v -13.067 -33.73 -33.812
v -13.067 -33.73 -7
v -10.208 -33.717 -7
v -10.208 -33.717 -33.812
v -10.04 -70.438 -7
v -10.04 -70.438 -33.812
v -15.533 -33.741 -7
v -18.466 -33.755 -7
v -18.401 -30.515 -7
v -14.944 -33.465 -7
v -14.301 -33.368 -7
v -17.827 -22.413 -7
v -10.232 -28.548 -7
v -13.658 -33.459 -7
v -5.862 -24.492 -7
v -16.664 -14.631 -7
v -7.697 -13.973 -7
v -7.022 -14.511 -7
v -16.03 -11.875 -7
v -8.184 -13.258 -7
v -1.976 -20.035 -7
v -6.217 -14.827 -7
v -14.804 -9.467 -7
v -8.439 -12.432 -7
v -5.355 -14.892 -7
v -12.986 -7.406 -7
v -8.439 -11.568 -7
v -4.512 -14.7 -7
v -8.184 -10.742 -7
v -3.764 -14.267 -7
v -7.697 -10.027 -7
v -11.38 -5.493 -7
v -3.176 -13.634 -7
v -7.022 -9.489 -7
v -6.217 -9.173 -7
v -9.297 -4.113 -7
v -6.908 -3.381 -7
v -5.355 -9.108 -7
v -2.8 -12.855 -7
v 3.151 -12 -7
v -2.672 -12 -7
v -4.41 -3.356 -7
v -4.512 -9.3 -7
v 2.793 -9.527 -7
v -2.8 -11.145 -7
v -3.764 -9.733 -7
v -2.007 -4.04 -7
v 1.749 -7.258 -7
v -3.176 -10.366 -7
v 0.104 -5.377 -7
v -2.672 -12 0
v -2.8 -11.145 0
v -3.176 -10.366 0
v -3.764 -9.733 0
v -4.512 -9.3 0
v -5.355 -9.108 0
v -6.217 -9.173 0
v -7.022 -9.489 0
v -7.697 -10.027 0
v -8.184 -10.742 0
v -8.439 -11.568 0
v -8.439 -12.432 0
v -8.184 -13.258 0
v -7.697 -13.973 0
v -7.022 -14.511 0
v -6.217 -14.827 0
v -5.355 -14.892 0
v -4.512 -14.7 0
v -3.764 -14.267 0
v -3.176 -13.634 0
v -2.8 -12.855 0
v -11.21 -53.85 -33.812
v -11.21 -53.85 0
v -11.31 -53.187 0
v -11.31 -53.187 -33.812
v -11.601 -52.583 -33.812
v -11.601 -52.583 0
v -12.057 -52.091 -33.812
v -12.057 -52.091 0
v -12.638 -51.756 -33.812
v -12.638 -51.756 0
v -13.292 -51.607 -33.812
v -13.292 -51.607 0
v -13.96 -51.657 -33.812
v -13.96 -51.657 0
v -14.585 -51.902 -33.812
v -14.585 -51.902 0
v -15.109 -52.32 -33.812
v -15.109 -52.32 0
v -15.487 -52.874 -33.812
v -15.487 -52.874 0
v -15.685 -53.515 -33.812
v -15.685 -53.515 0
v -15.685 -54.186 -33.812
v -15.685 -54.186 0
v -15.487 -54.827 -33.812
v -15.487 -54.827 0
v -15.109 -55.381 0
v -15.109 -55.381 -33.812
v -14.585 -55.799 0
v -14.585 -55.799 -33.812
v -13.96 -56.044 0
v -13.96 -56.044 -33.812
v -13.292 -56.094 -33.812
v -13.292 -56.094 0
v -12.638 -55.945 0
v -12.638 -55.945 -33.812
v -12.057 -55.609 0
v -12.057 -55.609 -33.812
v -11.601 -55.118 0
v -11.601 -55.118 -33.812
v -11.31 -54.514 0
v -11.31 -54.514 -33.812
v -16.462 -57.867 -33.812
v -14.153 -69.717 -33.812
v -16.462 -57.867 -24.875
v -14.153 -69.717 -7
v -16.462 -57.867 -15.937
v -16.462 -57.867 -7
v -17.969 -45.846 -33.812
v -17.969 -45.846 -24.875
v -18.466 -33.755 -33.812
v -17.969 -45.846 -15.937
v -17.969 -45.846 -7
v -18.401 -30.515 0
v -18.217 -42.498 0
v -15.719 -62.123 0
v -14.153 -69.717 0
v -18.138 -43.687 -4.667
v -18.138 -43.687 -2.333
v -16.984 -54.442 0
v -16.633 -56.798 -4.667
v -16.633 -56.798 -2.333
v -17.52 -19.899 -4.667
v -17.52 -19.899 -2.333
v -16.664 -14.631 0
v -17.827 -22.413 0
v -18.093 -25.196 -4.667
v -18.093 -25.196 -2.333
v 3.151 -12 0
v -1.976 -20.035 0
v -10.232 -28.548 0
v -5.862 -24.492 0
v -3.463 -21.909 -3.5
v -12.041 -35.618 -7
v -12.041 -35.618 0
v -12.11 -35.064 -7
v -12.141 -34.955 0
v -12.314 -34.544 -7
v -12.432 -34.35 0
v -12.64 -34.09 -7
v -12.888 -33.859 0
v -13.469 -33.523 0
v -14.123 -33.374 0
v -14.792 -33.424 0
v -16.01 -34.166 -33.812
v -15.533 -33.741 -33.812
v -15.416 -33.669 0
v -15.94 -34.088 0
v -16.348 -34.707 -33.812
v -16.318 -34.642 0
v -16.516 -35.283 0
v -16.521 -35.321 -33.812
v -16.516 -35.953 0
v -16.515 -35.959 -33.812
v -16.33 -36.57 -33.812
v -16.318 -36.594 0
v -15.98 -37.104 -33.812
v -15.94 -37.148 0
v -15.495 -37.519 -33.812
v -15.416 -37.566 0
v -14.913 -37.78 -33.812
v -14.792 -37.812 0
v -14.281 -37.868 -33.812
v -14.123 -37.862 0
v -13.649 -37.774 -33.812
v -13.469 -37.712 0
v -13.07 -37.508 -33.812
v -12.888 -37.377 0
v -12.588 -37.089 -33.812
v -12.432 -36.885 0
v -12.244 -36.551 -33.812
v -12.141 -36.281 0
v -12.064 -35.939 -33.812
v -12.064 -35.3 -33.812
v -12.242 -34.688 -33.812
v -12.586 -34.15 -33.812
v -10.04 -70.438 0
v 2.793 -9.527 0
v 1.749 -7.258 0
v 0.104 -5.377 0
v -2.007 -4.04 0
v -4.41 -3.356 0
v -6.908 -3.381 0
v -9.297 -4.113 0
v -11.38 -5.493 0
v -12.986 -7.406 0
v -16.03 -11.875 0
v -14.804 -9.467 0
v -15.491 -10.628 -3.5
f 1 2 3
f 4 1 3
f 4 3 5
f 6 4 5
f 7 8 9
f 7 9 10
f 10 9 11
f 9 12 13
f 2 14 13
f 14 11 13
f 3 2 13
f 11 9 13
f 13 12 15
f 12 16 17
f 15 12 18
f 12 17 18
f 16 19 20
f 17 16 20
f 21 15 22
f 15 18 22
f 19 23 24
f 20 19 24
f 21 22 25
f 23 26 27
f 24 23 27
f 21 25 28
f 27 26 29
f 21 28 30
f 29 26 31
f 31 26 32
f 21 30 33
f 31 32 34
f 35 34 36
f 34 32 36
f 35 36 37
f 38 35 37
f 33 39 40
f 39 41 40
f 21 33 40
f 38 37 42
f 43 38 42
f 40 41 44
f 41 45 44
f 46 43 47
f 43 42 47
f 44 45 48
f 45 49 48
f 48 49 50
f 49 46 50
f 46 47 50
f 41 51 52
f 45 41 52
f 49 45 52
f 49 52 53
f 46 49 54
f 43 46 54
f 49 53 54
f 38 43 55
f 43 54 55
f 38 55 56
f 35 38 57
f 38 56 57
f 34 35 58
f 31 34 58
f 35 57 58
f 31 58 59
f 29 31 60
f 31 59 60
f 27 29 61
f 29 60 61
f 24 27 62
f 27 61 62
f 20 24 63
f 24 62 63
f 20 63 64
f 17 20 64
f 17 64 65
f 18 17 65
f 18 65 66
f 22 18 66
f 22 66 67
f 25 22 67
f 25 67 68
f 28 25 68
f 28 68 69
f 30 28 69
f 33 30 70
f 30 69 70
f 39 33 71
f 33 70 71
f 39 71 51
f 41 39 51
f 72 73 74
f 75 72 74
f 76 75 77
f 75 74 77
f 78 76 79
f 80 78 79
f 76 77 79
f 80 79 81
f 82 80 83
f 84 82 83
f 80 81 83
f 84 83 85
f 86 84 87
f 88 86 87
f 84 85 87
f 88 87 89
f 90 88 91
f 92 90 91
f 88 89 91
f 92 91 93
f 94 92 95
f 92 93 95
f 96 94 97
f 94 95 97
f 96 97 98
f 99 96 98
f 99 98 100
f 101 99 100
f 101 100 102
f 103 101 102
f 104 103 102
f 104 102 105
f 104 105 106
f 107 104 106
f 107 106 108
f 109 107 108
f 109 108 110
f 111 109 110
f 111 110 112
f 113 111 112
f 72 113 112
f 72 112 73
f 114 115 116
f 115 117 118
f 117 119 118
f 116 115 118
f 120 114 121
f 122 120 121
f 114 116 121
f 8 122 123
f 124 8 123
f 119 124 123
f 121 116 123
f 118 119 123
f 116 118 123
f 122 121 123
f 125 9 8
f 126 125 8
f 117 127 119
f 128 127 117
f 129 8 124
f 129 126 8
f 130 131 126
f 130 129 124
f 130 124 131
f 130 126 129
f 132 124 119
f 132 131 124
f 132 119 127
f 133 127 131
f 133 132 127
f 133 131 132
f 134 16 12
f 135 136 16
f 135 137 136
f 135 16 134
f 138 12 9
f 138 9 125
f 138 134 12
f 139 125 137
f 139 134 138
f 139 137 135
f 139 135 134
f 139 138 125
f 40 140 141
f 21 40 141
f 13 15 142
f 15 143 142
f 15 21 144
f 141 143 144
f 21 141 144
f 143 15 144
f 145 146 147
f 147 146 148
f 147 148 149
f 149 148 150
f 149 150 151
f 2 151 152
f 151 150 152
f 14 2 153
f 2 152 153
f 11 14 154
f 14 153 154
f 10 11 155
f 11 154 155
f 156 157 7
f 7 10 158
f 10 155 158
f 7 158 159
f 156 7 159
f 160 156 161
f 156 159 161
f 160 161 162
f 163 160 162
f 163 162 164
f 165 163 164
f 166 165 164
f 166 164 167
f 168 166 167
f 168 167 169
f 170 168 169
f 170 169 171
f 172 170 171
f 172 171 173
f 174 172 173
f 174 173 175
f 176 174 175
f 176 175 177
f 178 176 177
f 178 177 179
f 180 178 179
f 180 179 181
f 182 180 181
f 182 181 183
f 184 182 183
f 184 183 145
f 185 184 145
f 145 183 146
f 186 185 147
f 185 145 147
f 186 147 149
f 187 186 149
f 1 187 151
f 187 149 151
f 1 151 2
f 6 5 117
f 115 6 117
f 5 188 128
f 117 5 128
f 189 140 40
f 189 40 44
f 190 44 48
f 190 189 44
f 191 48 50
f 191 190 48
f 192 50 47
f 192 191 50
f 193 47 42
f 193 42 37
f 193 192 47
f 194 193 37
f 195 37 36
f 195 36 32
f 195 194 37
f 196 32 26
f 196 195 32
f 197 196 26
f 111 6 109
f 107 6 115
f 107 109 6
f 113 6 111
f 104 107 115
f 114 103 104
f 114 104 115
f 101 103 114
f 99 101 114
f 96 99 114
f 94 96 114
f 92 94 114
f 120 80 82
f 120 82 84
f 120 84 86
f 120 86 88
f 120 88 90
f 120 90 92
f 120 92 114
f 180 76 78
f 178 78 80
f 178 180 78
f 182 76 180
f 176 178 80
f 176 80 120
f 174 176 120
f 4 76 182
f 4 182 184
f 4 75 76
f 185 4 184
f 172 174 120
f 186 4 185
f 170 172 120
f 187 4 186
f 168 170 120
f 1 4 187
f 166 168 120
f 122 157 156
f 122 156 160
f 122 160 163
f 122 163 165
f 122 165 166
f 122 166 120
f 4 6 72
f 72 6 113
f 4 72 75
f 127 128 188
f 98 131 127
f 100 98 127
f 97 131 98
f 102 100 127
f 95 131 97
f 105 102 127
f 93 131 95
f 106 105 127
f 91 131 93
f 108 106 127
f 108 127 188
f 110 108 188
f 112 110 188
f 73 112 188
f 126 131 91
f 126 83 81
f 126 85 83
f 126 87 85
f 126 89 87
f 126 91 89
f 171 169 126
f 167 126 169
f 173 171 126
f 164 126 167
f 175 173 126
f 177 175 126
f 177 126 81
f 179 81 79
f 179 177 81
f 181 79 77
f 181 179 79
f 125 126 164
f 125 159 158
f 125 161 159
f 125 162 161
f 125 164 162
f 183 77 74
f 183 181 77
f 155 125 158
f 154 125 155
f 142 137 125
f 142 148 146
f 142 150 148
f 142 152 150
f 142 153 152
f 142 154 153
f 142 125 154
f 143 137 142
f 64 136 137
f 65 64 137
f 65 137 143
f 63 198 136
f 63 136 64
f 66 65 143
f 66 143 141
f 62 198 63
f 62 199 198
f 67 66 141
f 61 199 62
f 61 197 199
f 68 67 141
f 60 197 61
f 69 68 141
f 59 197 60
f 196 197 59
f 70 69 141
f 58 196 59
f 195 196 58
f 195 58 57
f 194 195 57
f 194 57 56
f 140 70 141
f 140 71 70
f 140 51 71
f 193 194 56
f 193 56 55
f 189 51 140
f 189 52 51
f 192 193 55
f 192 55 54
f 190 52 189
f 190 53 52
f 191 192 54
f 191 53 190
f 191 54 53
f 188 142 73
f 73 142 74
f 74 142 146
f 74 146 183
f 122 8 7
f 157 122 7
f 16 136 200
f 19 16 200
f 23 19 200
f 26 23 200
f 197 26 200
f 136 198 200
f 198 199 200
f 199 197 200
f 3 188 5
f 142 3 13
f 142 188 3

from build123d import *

# Parameters (mm, degrees)
SKETCH1_R           = 2.9
BOSS_EXTRUDE1_DEPTH = 7
BOSS_EXTRUDE2_DEPTH = 26.812432
SKETCH3_R           = 2.25
CUT_EXTRUDE1_DEPTH  = 81.286678341


with BuildPart() as part:
    # Sketch1 → Boss-Extrude1 (new body)
    with BuildSketch(Plane.XY):
        with BuildLine():
            Line((-14.153385189, -69.716871134), (-10.039841479, -70.438427685))
            Line((-10.039841479, -70.438427685), (-10.231600818, -28.548135162))
            add(Edge.make_bspline(
                [(3.150526507, -12), (1.121426745, -15.448537633), (-2.522354698, -21.641292501), (-7.864373324, -26.42729642), (-10.231600818, -28.548135162)],
                knots=[0, 0, 0, 0, 0.556866484, 1, 1, 1, 1], degree=3))
            ThreePointArc((3.150526507, -12), (-3.18362895, -3.611112101), (-12.986183722, -7.406488955))
            add(Edge.make_bspline(
                [(-16.663916234, -14.630806425), (-16.157795835, -10.23676377), (-12.986183722, -7.406488955)],
                knots=[0, 0, 0, 1, 1, 1], degree=2))
            add(Edge.make_bspline(
                [(-16.663916234, -14.630806425), (-17.667702323, -19.881251045), (-18.220131563, -25.189037493), (-18.401311599, -30.514562532)],
                knots=[0, 0, 0, 0, 0.288118642, 0.288118642, 0.288118642, 0.288118642], degree=3))
            add(Edge.make_bspline(
                [(-18.401311599, -30.514562532), (-18.848969857, -43.672829442), (-17.03022033, -56.93938717), (-14.153385189, -69.716871134)],
                knots=[0.288118642, 0.288118642, 0.288118642, 0.288118642, 1, 1, 1, 1], degree=3))
        make_face()
        with Locations((-5.571628032, -12)):
            Circle(SKETCH1_R, mode=Mode.SUBTRACT)
    extrude(amount=-BOSS_EXTRUDE1_DEPTH)

    # Sketch2 → Boss-Extrude2 (add)
    with BuildSketch(Plane(origin=(0, 0, -7), x_dir=(-1, 0, 0), z_dir=(0, 0, -1))):
        with BuildLine():
            Line((10.039841479, -70.438427685), (14.153385189, -69.716871134))
            add(Edge.make_bspline(
                [(14.153385189, -69.716871134), (16.794208846, -57.987633874), (18.543433317, -45.846277061), (18.466393507, -33.754875992)],
                knots=[0.346520381, 0.346520381, 0.346520381, 0.346520381, 1, 1, 1, 1], degree=3))
            Line((18.466393507, -33.754875992), (15.532606101, -33.741446123))
            ThreePointArc((15.532606101, -33.741446123), (14.280806546, -37.867902739), (13.066837656, -33.730158684))
            Line((13.066837656, -33.730158684), (10.207939206, -33.717071631))
            Line((10.207939206, -33.717071631), (10.039841479, -70.438427685))
        make_face()
    extrude(amount=BOSS_EXTRUDE2_DEPTH)

    # Sketch3 → Cut-Extrude1 (cut, through all)
    with BuildSketch(Plane.XY):
        with Locations((-14.291106163, -35.617926313)):
            Circle(SKETCH3_R)
        with Locations((-13.459661862, -53.850312066)):
            Circle(SKETCH3_R)
    extrude(amount=-CUT_EXTRUDE1_DEPTH, mode=Mode.SUBTRACT)


solid = part.part
